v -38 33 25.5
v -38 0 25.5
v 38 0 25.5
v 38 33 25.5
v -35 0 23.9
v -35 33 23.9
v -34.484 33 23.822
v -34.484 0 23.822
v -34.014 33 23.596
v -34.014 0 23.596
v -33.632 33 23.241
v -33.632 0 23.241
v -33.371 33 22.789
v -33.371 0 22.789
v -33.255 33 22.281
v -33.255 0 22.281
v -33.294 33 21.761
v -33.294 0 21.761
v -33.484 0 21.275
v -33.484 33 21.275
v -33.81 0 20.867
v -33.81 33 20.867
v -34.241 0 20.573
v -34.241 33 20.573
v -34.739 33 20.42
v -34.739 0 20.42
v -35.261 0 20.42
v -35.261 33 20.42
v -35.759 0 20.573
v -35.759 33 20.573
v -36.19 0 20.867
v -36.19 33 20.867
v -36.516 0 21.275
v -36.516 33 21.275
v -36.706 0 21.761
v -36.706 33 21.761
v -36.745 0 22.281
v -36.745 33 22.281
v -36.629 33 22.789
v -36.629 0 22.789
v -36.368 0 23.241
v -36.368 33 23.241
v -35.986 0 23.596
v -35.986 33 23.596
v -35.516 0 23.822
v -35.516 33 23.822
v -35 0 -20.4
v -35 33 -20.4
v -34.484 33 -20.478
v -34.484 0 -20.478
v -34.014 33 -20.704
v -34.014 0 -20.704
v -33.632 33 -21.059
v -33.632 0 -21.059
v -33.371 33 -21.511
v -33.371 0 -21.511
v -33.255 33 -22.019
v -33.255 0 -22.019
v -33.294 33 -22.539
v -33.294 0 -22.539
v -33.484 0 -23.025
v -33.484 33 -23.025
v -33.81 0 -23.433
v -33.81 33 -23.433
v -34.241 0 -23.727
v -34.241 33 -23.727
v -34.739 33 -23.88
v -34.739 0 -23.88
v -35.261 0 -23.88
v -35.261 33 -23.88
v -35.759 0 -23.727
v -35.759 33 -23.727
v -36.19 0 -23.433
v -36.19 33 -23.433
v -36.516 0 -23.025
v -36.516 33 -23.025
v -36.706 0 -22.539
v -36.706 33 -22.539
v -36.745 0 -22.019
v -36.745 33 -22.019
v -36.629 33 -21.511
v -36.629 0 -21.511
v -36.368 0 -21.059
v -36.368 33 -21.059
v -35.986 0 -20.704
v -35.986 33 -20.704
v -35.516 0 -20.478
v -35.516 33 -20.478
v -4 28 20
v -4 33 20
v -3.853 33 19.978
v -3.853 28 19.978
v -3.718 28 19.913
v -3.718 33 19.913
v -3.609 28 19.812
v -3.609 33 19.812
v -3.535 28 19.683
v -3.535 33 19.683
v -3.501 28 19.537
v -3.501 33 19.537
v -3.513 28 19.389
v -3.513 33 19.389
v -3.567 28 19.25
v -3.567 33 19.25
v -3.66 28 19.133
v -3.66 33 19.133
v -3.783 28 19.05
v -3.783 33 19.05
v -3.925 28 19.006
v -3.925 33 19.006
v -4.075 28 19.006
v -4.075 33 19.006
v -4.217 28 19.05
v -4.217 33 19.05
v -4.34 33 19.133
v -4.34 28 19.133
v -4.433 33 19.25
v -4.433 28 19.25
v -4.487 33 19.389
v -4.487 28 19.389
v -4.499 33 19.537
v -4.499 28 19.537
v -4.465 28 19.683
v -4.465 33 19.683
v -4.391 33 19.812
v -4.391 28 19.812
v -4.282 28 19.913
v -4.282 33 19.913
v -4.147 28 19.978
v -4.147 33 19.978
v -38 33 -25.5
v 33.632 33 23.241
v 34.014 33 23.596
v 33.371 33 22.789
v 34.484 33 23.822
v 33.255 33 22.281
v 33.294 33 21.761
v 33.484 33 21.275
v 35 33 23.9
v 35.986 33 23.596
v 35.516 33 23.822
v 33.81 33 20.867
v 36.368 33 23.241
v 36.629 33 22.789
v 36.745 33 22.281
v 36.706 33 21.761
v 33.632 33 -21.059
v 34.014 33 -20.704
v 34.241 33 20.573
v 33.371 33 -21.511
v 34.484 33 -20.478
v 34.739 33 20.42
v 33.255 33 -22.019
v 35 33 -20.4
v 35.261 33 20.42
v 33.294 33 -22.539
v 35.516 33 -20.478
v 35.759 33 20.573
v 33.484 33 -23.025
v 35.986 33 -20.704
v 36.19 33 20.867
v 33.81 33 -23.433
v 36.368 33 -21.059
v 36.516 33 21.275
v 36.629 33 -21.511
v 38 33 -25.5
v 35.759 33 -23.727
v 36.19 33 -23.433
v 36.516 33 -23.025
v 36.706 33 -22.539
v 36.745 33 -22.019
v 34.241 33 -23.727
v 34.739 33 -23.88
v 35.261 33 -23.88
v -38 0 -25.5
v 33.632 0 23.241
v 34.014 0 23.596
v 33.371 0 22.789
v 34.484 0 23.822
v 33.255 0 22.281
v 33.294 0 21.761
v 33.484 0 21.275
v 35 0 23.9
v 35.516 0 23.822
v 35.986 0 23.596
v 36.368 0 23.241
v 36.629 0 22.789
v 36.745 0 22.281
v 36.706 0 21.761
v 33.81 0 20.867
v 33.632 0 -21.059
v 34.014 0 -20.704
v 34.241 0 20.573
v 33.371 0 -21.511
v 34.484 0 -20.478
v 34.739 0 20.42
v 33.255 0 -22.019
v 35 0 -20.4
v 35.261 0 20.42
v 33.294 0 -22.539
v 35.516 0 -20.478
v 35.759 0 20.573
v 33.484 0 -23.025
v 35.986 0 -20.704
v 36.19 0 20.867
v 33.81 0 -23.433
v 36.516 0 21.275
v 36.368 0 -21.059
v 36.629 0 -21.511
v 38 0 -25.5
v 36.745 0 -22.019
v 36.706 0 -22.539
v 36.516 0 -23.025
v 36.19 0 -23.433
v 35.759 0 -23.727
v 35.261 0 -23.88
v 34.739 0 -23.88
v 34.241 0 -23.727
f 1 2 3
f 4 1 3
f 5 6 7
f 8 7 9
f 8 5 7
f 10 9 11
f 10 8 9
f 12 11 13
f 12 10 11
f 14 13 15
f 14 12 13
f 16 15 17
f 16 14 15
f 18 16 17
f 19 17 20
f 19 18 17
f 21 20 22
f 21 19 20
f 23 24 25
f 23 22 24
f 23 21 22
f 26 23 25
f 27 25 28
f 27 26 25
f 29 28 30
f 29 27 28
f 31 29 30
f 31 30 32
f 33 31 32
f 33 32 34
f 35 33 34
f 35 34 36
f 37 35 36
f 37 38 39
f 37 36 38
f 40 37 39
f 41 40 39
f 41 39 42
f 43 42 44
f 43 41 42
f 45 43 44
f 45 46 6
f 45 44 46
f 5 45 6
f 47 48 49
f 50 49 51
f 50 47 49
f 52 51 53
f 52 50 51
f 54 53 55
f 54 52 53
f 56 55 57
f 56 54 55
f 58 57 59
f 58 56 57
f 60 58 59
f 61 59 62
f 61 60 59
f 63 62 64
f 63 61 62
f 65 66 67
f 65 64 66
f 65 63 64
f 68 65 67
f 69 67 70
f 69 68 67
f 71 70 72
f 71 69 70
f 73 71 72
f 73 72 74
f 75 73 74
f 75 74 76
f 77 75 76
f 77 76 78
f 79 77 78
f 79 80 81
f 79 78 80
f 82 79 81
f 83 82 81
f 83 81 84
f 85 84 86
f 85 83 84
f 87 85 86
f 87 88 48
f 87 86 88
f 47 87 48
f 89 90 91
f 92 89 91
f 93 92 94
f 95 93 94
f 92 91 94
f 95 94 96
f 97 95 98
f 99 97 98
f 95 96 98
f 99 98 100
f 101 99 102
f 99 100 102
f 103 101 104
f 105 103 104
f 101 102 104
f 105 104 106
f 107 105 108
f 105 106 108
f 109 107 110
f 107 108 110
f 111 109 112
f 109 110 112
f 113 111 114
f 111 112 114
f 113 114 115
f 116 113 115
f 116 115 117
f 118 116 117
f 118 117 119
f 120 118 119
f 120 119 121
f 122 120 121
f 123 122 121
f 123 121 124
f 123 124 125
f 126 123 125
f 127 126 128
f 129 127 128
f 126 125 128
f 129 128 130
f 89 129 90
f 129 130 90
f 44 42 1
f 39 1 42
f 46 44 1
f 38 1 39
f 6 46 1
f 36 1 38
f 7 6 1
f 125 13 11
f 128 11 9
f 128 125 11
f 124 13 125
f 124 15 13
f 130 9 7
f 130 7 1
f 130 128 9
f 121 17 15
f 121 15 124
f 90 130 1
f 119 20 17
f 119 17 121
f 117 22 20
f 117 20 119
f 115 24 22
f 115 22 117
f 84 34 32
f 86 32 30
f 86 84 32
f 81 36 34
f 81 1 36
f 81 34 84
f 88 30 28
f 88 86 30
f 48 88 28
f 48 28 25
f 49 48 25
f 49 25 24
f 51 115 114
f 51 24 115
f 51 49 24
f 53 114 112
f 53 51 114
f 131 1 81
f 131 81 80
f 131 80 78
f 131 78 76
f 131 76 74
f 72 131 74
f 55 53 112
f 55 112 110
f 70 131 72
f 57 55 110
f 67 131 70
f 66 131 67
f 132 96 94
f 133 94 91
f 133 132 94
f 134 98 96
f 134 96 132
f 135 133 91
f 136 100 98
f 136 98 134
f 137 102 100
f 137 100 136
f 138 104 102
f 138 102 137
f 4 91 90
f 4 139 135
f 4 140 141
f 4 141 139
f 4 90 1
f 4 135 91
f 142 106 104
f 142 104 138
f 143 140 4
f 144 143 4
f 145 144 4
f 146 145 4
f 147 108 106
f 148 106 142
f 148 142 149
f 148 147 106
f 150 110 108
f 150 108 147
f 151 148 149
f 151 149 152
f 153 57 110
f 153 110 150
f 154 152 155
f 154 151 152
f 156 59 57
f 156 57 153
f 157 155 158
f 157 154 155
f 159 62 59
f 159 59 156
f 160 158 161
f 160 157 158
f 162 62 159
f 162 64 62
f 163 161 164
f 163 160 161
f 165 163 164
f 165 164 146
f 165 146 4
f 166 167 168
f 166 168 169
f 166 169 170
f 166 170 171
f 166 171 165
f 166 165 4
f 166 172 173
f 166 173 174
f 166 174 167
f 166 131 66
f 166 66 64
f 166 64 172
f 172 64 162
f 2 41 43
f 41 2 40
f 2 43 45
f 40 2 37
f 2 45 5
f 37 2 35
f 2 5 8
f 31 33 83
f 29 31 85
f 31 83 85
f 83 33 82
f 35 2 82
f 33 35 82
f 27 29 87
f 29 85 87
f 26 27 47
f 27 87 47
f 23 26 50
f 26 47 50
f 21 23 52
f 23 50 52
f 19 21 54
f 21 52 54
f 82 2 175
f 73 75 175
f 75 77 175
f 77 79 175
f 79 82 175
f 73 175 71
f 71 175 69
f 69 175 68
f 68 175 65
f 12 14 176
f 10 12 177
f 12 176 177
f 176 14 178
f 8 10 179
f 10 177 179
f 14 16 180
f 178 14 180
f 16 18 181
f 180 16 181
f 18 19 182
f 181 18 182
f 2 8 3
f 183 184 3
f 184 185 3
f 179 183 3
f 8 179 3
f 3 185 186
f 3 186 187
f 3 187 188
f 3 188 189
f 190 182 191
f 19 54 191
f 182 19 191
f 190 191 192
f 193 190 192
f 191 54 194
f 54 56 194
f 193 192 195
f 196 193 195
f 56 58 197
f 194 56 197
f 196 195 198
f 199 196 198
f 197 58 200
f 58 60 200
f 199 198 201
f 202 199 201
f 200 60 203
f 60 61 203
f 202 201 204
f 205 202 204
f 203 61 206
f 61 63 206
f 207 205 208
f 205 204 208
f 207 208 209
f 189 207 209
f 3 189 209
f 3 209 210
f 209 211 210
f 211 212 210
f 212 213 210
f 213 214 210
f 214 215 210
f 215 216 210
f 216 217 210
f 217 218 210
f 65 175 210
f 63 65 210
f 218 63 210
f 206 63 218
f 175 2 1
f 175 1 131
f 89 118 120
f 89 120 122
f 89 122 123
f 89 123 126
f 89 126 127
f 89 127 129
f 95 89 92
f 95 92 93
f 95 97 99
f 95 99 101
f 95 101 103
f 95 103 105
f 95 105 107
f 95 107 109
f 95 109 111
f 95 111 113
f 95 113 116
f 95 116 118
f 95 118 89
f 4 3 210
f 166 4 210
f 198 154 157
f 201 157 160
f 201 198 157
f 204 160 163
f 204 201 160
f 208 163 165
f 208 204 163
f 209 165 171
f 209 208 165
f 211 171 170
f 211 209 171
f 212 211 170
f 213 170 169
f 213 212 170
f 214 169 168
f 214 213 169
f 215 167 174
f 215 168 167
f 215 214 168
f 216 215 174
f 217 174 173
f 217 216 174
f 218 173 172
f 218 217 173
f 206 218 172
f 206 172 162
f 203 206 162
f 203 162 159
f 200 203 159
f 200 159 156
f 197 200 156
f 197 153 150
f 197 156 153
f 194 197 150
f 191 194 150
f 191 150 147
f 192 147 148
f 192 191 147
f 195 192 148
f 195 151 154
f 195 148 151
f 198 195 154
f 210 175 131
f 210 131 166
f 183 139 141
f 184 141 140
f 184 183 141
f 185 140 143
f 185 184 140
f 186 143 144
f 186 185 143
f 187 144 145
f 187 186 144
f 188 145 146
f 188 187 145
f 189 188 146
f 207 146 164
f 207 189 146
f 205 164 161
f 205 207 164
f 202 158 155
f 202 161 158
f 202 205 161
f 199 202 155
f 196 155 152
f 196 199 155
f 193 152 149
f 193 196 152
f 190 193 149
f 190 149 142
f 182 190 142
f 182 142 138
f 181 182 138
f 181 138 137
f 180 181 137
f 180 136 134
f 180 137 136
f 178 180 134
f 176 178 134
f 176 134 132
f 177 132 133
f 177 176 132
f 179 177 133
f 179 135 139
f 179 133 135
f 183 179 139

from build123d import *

# Parameters (mm, degrees)
SKETCH1_W                 = 76
SKETCH1_H                 = 51
BOSS_EXTRUDE1_DEPTH       = 33
SKETCH2_R                 = 1.75
CUT_EXTRUDE1_DEPTH        = 57.420297766
SKETCH3_R                 = 0.5
IMU_CENTER_LOCATION_DEPTH = 5


with BuildPart() as part:
    # Sketch1 → Boss-Extrude1 (new body)
    with BuildSketch(Plane(origin=(0, 0, 0), x_dir=(1, 0, 0), z_dir=(0, 1, 0))):
        Rectangle(SKETCH1_W, SKETCH1_H)
    extrude(amount=BOSS_EXTRUDE1_DEPTH)

    # Sketch2 → Cut-Extrude1 (cut, through all)
    with BuildSketch(Plane(origin=(0, 0, 0), x_dir=(1, 0, 0), z_dir=(0, 1, 0))):
        with Locations(Location((-35, 22.15, 0), (0, 0, 270))):
            Circle(SKETCH2_R)
        with Locations(Location((35, 22.15, 0), (0, 0, 270))):
            Circle(SKETCH2_R)
        with Locations(Location((35, -22.15, 0), (0, 0, 270))):
            Circle(SKETCH2_R)
        with Locations(Location((-35, -22.15, 0), (0, 0, 270))):
            Circle(SKETCH2_R)
    extrude(amount=CUT_EXTRUDE1_DEPTH, mode=Mode.SUBTRACT)

    # Sketch3 → IMU_center_location (cut)
    with BuildSketch(Plane(origin=(0, 33, 0), x_dir=(1, 0, 0), z_dir=(0, 1, 0))):
        with Locations(Location((-4, -19.5, 0), (0, 0, 270))):
            Circle(SKETCH3_R)
    extrude(amount=-IMU_CENTER_LOCATION_DEPTH, mode=Mode.SUBTRACT)


solid = part.part
